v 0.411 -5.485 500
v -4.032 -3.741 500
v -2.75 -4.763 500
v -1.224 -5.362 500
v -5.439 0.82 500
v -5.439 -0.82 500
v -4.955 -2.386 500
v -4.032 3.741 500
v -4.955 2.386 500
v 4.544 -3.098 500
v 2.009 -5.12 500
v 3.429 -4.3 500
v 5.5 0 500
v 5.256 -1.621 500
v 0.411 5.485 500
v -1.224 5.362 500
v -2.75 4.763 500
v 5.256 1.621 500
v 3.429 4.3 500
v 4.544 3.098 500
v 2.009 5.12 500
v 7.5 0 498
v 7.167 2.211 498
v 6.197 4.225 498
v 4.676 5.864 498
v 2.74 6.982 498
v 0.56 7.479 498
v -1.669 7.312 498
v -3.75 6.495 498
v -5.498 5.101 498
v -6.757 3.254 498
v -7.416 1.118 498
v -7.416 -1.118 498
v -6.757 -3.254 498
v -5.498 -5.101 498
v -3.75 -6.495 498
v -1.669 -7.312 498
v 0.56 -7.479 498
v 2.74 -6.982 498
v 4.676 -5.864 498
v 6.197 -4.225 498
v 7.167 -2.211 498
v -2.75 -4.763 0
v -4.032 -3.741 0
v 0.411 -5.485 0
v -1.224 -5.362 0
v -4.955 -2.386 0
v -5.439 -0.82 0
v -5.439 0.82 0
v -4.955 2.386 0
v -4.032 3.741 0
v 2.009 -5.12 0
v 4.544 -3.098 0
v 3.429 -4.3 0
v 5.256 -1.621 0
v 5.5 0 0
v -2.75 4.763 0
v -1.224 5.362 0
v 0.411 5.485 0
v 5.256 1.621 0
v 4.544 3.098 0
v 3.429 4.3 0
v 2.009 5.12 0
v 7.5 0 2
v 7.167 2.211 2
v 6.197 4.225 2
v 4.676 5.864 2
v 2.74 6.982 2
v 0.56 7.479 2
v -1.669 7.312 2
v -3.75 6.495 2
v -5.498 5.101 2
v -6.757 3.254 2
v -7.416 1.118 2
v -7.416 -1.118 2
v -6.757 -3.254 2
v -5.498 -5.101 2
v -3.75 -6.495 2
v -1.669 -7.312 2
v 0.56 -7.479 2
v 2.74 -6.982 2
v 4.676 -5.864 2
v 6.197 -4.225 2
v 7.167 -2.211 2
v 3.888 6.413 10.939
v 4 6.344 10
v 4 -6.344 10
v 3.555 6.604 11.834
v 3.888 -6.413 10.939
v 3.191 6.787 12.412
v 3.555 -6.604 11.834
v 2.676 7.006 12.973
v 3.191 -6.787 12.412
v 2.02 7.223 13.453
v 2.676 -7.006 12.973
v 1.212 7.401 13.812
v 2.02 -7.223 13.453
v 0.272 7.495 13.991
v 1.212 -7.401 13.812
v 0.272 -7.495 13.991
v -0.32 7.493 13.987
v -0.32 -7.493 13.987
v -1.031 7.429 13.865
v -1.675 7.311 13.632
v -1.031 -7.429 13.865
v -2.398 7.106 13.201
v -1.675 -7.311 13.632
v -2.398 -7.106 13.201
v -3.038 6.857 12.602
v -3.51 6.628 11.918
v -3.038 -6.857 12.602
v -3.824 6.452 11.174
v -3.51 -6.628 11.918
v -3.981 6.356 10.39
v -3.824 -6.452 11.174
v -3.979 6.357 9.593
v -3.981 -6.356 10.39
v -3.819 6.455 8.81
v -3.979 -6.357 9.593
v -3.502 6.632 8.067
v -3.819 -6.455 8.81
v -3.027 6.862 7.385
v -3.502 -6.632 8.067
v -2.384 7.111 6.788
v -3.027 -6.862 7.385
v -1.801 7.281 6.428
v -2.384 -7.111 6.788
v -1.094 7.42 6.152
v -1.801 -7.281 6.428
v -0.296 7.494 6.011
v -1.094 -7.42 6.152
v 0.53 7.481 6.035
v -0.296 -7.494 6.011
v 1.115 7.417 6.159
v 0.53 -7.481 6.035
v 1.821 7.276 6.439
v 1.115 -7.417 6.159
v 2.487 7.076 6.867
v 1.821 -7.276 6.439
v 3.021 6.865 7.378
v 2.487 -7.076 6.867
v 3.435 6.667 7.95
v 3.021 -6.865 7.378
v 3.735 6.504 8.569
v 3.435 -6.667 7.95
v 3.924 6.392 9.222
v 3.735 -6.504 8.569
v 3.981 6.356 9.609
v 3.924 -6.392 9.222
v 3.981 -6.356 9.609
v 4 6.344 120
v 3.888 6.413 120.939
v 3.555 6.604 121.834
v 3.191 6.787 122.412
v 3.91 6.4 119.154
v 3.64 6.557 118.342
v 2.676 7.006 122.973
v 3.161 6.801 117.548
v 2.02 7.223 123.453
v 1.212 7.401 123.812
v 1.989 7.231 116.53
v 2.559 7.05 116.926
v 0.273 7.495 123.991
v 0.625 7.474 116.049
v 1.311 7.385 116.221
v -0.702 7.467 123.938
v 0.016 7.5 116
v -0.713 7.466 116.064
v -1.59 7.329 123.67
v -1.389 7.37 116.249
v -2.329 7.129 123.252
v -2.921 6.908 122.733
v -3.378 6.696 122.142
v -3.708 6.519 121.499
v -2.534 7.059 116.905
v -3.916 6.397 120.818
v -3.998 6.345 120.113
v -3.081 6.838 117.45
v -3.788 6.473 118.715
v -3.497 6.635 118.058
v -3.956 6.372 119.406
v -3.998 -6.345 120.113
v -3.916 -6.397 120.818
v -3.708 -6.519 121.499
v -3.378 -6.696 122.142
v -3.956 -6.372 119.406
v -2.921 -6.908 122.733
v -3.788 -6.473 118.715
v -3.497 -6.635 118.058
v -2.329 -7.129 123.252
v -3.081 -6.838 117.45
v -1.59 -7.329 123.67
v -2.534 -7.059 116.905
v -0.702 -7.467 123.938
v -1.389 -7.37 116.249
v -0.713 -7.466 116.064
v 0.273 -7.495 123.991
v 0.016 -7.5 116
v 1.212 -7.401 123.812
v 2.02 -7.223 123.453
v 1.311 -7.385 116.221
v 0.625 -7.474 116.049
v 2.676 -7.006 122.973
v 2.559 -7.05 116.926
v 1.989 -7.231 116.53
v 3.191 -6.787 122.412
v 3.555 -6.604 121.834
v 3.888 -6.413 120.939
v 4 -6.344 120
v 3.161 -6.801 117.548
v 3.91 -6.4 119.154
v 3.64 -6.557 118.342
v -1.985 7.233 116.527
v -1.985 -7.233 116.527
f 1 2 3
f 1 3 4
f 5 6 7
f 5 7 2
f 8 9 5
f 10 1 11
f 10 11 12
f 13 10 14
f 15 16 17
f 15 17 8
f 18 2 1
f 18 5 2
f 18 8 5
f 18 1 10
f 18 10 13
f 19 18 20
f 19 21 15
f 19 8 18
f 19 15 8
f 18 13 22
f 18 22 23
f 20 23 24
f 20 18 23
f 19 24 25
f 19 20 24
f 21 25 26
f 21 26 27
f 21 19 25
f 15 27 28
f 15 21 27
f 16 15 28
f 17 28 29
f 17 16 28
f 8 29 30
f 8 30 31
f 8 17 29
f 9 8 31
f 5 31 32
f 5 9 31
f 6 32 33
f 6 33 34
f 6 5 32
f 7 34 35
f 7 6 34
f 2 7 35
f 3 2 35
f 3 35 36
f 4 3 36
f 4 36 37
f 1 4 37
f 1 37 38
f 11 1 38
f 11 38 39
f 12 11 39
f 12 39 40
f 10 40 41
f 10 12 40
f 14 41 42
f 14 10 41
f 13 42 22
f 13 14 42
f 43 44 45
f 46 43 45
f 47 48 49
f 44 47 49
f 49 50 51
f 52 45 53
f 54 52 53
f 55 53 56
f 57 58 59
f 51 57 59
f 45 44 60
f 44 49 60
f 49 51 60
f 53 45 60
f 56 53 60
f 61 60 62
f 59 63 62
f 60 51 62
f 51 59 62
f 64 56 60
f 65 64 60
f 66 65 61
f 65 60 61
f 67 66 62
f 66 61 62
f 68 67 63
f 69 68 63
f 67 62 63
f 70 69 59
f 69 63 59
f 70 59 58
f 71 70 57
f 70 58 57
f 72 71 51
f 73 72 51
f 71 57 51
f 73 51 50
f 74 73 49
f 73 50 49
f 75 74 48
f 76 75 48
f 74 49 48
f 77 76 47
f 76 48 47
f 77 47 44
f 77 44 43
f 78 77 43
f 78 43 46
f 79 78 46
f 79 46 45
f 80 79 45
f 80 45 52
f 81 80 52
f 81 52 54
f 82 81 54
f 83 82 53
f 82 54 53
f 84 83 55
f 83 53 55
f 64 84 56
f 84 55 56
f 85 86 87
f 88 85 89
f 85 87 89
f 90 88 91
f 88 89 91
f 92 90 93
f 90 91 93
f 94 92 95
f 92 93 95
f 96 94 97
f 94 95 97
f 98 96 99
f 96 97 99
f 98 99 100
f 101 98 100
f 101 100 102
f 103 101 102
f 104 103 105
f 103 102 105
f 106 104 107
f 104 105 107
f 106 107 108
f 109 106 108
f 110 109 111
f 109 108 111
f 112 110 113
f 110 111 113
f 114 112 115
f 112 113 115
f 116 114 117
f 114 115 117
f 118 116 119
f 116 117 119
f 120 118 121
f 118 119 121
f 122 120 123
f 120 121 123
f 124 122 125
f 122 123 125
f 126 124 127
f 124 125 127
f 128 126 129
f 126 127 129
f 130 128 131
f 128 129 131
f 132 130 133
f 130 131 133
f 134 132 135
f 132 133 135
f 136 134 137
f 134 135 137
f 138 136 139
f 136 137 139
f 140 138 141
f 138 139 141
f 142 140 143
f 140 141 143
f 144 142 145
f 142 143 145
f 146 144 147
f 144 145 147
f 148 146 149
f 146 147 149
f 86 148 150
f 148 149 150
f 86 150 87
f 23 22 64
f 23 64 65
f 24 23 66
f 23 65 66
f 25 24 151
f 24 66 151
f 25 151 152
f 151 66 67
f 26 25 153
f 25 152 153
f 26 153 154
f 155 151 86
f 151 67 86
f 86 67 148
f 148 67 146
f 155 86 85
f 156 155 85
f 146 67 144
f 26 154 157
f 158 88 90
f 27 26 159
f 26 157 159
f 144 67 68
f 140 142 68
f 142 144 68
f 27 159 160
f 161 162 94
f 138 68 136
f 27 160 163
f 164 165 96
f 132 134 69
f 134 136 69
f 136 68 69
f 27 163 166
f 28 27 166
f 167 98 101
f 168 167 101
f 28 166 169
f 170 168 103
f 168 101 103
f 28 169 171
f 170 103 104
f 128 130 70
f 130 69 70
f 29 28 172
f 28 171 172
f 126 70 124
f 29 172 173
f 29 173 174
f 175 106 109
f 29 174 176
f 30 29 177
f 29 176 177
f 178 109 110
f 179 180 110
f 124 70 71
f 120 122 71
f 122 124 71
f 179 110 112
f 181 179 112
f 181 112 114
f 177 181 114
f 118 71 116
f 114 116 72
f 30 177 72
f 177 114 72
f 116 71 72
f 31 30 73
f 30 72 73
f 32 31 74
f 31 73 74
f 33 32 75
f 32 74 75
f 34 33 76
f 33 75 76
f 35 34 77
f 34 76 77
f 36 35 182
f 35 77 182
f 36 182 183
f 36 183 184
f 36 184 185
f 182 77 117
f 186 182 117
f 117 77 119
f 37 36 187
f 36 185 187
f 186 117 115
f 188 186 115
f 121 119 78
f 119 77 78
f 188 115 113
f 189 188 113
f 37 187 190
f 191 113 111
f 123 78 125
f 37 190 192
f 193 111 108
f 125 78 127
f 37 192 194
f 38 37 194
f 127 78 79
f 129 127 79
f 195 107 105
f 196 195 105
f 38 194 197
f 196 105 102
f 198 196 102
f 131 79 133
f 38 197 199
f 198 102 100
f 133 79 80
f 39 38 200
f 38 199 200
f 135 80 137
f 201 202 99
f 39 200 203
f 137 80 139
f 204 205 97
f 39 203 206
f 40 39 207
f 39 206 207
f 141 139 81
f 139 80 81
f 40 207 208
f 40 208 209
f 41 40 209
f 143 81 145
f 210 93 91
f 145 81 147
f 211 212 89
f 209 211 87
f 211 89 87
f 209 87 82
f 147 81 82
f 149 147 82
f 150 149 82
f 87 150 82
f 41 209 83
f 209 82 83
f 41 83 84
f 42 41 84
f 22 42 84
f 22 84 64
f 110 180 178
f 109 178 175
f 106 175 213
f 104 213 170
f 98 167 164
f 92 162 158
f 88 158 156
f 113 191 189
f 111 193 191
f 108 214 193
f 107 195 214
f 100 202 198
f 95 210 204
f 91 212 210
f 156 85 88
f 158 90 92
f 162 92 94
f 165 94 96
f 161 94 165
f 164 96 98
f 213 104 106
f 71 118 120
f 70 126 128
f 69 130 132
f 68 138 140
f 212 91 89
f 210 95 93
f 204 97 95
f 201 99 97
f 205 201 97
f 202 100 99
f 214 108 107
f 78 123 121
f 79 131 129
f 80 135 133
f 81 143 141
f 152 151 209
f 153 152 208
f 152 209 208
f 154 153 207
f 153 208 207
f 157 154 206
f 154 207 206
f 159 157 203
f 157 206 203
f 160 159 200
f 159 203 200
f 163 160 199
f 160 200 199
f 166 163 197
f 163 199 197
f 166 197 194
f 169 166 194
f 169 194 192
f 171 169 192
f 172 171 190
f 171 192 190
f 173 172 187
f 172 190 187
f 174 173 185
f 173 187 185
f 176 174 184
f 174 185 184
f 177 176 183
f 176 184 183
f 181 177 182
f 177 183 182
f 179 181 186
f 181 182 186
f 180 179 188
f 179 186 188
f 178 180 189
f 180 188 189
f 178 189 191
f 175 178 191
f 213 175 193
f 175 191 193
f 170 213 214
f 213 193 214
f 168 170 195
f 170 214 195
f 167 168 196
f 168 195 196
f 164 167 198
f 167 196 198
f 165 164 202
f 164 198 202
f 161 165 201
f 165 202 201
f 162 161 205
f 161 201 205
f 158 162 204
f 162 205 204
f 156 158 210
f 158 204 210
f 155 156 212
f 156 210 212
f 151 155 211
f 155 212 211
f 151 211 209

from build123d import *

# Parameters (mm, degrees)
F0_R     = 7.5
F1_DEPTH = 500
F2_SIZE  = 2
F3_R     = 4
F4_DEPTH = 10


with BuildPart() as f1:
    # F0 (on Top) → F1 (new body)
    with BuildSketch(Plane.XY):
        Circle(F0_R)
    extrude(amount=F1_DEPTH)

    # F2
    f2_edges = [f1.edges().sort_by_distance(p)[0] for p in [
        (-7.5, 0, 0),
        (-7.5, 0, 500),
    ]]
    chamfer(f2_edges, length=F2_SIZE)

    # F3 (on Front) → F4 (cut, symmetric)
    with BuildSketch(Plane.XZ):
        with Locations((0, 10)):
            Circle(F3_R)
        with Locations((0, 120)):
            Circle(F3_R)
    extrude(amount=F4_DEPTH, both=True, mode=Mode.SUBTRACT)


solid = f1.part
